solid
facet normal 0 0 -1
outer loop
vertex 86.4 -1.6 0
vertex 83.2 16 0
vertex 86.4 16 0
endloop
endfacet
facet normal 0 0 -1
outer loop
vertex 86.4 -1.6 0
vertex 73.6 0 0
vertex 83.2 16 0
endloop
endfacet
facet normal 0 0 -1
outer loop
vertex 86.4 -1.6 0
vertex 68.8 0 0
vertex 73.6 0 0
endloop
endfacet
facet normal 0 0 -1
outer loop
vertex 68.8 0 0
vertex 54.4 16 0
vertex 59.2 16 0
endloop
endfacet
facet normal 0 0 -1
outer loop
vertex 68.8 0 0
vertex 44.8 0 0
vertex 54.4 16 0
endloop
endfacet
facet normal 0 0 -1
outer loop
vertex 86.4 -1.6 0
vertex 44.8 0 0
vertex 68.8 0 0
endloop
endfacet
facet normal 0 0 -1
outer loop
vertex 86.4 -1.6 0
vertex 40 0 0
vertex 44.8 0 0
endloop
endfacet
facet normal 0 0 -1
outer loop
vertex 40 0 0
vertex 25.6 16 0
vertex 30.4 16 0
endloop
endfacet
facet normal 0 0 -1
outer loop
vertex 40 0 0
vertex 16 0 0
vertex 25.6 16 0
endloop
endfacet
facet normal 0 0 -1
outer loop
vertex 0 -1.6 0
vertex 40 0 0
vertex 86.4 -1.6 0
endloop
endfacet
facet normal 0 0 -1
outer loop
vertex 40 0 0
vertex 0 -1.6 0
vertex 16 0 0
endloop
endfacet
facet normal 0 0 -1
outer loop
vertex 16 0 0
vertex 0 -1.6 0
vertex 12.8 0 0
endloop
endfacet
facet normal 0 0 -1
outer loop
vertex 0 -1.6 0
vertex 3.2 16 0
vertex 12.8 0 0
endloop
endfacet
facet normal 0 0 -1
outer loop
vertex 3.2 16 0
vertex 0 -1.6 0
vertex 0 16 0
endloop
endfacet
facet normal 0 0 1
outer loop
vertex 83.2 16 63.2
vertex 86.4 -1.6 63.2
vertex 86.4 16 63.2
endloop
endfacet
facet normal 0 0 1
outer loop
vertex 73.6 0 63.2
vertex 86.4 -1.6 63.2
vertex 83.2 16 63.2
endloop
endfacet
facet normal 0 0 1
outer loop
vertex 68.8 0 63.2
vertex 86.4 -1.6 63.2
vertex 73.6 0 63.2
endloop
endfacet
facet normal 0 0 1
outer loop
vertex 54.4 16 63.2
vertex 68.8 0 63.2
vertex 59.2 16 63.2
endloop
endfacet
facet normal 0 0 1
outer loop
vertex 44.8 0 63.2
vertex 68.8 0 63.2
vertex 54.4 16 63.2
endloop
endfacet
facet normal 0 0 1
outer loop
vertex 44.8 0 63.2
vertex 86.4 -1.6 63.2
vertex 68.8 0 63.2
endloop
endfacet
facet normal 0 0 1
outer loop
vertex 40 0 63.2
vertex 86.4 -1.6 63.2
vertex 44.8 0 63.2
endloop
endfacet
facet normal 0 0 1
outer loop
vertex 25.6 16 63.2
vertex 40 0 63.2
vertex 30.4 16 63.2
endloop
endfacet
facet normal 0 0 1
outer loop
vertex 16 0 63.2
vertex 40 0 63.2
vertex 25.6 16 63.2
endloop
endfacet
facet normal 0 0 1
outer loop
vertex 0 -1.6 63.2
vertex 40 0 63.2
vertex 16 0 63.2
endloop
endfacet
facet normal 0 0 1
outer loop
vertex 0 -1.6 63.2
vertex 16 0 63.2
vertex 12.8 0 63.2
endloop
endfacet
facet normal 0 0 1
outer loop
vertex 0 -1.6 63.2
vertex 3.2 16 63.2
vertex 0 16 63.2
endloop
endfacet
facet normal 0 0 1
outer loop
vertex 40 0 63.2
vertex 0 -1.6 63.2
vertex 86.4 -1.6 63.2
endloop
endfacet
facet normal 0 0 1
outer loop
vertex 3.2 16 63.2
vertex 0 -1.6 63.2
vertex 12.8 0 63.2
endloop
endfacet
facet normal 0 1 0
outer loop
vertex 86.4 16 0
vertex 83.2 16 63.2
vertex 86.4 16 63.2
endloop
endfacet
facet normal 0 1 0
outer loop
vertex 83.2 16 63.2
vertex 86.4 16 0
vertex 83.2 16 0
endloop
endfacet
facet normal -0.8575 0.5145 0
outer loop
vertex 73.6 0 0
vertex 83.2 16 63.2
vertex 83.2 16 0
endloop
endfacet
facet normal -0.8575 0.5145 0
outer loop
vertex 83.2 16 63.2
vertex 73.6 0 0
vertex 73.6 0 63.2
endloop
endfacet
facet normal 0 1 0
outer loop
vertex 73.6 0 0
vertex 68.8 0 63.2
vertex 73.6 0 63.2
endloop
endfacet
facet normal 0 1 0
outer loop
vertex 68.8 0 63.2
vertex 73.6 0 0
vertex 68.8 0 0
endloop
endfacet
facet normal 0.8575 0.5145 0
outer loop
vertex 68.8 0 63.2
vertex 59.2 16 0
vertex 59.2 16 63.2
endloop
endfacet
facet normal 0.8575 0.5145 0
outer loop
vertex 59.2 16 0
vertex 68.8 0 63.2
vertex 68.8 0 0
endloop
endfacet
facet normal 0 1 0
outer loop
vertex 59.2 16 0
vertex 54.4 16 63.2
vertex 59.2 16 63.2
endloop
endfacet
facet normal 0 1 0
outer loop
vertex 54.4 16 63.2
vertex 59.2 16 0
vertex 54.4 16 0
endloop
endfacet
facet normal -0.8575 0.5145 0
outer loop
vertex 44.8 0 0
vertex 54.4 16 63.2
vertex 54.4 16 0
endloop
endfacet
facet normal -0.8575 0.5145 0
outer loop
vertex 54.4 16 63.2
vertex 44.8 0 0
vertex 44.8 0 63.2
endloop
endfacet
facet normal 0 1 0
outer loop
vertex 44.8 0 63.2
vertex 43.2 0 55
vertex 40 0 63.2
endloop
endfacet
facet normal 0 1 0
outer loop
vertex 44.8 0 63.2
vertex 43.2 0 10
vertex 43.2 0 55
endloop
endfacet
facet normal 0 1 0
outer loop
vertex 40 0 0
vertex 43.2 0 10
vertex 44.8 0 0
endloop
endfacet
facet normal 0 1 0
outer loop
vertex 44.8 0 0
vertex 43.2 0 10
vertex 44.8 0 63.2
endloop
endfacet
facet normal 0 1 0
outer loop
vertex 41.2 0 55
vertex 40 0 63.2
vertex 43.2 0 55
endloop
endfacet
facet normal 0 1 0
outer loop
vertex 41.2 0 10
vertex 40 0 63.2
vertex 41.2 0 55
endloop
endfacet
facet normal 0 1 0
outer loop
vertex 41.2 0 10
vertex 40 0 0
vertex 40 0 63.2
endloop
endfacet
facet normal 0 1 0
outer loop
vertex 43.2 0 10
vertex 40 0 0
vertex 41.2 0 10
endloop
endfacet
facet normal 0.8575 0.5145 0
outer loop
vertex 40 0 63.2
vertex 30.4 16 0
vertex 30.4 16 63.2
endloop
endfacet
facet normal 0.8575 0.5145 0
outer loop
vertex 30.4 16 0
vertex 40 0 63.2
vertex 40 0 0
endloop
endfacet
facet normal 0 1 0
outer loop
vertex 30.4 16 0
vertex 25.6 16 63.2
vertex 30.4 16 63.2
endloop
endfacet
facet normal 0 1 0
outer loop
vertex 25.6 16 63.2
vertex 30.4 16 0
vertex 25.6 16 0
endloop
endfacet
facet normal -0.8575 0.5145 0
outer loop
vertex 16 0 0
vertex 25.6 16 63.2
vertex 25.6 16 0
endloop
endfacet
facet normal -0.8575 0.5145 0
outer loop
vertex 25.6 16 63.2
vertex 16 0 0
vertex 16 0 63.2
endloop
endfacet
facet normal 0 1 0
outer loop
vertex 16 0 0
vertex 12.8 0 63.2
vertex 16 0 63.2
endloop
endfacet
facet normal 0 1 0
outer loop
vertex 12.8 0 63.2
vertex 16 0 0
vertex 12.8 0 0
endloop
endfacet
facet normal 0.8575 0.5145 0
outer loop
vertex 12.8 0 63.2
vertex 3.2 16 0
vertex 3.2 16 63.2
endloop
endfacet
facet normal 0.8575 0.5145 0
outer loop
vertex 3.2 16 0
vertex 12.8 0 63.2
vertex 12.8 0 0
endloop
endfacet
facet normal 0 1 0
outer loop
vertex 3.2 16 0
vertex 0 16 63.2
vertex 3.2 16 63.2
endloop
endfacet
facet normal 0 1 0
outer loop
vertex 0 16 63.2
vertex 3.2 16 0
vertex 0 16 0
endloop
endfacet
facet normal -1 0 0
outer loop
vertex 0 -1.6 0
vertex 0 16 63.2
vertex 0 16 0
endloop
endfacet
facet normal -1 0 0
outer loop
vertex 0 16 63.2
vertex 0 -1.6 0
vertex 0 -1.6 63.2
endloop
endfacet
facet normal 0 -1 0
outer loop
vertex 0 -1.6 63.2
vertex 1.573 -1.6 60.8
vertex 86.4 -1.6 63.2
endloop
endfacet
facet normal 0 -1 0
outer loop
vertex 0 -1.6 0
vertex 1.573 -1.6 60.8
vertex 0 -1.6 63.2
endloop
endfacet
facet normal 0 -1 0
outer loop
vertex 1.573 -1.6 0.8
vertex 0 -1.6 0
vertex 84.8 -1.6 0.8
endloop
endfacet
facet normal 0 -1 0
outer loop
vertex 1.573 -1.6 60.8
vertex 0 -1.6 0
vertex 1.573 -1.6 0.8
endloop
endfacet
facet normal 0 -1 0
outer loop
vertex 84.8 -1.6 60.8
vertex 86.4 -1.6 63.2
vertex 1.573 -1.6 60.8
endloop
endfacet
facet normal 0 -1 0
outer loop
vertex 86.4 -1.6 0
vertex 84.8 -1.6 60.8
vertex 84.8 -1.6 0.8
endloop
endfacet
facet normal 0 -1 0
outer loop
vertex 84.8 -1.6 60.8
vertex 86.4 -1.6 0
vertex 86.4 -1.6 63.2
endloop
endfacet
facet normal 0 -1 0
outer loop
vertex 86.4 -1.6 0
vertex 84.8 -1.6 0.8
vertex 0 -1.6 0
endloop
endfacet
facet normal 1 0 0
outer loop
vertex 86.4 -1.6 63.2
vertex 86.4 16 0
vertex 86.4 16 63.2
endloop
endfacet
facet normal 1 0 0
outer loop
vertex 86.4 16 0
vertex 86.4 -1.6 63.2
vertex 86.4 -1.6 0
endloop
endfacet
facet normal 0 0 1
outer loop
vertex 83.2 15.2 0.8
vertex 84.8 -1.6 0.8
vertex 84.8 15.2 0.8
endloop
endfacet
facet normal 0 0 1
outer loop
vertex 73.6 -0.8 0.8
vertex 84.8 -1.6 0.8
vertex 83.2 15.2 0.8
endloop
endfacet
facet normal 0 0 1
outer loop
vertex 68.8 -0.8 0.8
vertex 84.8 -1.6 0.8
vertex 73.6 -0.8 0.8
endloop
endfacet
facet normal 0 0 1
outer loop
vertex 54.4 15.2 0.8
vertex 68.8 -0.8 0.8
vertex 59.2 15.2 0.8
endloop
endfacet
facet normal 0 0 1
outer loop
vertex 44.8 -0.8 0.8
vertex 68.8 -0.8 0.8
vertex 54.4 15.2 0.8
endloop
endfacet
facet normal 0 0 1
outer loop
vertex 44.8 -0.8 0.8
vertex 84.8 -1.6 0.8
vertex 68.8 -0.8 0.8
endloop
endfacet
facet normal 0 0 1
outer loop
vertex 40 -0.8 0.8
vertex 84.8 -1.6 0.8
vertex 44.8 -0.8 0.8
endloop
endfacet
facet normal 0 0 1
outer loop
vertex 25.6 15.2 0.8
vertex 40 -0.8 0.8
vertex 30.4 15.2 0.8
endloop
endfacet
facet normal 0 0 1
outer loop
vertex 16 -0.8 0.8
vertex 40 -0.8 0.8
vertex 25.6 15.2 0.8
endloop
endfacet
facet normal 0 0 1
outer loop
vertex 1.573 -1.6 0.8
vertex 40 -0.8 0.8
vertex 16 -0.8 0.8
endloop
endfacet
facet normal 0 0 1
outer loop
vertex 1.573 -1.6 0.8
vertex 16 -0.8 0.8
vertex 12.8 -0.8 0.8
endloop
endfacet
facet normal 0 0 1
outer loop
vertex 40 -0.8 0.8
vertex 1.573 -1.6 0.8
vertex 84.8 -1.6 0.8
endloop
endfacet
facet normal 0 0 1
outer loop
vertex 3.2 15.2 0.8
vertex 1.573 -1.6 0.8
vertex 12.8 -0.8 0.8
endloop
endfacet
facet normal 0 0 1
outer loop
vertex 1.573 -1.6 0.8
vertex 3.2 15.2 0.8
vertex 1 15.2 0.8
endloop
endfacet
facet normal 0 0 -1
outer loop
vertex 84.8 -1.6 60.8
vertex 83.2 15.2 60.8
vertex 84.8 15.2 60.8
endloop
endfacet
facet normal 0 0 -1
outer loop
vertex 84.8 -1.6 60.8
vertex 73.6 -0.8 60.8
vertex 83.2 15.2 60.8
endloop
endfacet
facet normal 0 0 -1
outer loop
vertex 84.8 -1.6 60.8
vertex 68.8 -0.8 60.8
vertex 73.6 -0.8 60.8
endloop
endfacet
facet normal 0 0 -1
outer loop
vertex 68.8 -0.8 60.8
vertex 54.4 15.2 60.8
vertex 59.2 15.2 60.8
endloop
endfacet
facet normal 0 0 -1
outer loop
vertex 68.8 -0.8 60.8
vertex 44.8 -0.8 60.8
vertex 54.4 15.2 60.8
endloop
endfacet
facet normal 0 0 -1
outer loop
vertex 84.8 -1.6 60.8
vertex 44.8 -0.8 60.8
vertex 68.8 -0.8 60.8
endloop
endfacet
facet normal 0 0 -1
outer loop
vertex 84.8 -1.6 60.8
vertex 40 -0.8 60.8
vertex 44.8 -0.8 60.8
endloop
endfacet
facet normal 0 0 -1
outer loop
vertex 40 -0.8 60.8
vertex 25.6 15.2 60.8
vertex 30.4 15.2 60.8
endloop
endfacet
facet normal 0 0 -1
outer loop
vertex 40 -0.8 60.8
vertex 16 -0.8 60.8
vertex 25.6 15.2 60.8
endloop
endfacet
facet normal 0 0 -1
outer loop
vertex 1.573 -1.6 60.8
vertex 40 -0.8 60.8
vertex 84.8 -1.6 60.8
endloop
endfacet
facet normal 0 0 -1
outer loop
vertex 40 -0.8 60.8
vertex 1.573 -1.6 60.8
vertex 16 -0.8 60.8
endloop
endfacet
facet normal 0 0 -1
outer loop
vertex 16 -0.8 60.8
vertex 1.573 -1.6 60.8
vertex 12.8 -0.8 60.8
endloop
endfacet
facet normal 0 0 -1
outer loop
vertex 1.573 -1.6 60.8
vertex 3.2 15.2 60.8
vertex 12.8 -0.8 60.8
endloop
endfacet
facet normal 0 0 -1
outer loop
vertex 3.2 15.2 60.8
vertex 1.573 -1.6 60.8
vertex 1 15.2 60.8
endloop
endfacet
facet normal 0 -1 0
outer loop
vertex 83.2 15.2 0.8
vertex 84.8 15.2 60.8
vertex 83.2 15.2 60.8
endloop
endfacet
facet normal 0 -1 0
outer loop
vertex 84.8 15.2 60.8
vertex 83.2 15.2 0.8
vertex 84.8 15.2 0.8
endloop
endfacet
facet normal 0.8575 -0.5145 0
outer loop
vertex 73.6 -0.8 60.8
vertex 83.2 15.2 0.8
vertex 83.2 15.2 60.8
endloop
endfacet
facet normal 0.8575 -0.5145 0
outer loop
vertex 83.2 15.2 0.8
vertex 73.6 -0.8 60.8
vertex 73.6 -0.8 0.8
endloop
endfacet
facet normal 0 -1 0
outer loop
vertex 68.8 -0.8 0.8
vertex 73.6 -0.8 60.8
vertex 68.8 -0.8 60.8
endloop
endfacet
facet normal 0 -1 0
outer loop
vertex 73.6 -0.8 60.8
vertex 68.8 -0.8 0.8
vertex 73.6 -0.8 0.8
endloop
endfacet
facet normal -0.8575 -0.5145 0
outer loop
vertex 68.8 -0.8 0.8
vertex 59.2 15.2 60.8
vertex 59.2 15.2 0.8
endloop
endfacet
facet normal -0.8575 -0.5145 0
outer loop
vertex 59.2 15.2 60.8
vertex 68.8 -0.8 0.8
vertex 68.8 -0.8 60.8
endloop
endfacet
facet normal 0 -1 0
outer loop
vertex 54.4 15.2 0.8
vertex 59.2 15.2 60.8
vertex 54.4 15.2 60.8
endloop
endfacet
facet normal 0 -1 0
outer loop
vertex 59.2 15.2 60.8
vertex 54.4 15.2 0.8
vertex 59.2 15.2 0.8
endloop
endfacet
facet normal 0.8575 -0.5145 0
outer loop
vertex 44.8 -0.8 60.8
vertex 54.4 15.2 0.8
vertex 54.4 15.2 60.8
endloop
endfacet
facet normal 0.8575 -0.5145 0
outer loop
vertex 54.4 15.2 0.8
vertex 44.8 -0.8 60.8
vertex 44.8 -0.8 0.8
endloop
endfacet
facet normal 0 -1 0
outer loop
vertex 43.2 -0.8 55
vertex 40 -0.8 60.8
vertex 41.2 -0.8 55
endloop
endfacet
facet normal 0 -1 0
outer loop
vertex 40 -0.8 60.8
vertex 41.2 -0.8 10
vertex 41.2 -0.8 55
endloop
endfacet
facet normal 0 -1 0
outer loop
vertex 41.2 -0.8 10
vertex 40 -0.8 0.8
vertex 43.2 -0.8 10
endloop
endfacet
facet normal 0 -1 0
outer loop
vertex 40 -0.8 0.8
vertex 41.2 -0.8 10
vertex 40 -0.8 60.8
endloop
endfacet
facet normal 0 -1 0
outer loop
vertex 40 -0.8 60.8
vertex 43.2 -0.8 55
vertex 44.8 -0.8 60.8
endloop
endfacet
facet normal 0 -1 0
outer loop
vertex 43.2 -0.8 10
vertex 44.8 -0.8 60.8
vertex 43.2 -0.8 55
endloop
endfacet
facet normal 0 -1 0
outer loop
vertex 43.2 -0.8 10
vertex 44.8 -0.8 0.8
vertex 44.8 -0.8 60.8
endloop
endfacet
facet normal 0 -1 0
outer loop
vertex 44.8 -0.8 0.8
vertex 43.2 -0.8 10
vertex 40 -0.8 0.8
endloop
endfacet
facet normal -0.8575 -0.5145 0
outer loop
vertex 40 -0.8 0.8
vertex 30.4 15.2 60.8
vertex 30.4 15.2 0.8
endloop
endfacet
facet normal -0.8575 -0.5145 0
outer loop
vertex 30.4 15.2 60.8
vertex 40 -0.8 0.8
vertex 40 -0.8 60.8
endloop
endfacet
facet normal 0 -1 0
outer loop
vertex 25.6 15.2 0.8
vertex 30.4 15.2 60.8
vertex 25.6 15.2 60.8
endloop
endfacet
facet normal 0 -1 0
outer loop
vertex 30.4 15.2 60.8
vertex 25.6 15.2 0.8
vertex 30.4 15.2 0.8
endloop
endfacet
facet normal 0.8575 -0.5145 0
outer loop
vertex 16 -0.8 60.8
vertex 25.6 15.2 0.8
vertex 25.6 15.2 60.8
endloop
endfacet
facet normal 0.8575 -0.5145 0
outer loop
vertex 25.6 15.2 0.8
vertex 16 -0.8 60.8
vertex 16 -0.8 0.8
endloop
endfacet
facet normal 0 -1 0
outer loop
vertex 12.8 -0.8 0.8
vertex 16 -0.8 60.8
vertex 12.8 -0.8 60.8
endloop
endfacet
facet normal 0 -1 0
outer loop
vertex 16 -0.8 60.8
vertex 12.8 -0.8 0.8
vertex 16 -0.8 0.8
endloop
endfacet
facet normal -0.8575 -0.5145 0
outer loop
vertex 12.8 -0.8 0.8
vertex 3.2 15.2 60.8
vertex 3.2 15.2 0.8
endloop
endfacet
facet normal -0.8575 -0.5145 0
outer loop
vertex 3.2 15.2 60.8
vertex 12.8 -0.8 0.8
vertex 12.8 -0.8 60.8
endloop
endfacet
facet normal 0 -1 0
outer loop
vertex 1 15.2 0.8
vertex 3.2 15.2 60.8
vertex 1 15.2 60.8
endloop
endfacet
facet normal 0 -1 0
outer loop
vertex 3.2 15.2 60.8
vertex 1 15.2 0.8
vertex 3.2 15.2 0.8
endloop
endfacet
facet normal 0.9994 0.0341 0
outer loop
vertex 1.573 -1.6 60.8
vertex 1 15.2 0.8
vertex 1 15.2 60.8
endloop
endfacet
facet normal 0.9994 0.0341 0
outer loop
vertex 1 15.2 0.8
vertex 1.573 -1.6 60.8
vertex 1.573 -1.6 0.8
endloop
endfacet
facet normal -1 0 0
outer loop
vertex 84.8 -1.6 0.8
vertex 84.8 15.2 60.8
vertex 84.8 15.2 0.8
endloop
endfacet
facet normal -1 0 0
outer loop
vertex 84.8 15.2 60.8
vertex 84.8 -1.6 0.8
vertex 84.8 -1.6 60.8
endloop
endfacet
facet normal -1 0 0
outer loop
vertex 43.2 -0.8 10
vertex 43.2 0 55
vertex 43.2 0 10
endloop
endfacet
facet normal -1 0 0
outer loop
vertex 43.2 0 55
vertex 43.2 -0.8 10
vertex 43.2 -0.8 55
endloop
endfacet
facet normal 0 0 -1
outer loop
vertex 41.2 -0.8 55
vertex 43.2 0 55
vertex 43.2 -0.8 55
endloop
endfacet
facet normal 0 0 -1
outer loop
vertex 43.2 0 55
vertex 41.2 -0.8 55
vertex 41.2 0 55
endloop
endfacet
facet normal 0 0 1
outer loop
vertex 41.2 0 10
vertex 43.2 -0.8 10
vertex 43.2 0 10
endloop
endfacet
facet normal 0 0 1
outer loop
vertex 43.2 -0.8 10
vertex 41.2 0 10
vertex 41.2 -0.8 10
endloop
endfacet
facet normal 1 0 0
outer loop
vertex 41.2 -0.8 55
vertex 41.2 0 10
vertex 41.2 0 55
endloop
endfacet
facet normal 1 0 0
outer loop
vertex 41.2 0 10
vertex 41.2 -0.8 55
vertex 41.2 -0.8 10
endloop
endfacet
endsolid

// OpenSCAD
nozzledia = 0.8;
thickness =2*nozzledia;
height = 60;
difference() {
linear_extrude(height=height+2*thickness)
roof(nozzledia*2);
   translate([0,-nozzledia,nozzledia]) linear_extrude(height=height)
roofinner(nozzledia*2);
    translate([51.5*nozzledia,-2,10])cube([2,5,45]);
}
module roof(n)
polygon(
        points=
            [[0,10*n],[2*n,10*n],[8*n,0],[10*n,0],[16*n,10*n],[19*n,10*n],[25*n,0],[28*n,0],[34*n,10*n],[37*n,10*n],[43*n,0],[46*n,0],[52*n,10*n],[54*n,10*n],[54*n,-1*n],[0,-1*n]],
        paths=
            [[0, 1, 2, 3, 4, 5, 6, 7, 8, 9, 10, 11, 12, 13, 14, 15, 0]]
    );


module roofinner(n)
polygon(
        points=
            [[1,10*n],[2*n,10*n],[8*n,0],[10*n,0],[16*n,10*n],[19*n,10*n],[25*n,0],[28*n,0],[34*n,10*n],[37*n,10*n],[43*n,0],[46*n,0],[52*n,10*n],[53*n,10*n],[53*n,-1*n],[1*n,-1*n]],
        paths=
            [[0, 1, 2, 3, 4, 5, 6, 7, 8, 9, 10, 11, 12, 13, 14, 15, 0]]
    );
